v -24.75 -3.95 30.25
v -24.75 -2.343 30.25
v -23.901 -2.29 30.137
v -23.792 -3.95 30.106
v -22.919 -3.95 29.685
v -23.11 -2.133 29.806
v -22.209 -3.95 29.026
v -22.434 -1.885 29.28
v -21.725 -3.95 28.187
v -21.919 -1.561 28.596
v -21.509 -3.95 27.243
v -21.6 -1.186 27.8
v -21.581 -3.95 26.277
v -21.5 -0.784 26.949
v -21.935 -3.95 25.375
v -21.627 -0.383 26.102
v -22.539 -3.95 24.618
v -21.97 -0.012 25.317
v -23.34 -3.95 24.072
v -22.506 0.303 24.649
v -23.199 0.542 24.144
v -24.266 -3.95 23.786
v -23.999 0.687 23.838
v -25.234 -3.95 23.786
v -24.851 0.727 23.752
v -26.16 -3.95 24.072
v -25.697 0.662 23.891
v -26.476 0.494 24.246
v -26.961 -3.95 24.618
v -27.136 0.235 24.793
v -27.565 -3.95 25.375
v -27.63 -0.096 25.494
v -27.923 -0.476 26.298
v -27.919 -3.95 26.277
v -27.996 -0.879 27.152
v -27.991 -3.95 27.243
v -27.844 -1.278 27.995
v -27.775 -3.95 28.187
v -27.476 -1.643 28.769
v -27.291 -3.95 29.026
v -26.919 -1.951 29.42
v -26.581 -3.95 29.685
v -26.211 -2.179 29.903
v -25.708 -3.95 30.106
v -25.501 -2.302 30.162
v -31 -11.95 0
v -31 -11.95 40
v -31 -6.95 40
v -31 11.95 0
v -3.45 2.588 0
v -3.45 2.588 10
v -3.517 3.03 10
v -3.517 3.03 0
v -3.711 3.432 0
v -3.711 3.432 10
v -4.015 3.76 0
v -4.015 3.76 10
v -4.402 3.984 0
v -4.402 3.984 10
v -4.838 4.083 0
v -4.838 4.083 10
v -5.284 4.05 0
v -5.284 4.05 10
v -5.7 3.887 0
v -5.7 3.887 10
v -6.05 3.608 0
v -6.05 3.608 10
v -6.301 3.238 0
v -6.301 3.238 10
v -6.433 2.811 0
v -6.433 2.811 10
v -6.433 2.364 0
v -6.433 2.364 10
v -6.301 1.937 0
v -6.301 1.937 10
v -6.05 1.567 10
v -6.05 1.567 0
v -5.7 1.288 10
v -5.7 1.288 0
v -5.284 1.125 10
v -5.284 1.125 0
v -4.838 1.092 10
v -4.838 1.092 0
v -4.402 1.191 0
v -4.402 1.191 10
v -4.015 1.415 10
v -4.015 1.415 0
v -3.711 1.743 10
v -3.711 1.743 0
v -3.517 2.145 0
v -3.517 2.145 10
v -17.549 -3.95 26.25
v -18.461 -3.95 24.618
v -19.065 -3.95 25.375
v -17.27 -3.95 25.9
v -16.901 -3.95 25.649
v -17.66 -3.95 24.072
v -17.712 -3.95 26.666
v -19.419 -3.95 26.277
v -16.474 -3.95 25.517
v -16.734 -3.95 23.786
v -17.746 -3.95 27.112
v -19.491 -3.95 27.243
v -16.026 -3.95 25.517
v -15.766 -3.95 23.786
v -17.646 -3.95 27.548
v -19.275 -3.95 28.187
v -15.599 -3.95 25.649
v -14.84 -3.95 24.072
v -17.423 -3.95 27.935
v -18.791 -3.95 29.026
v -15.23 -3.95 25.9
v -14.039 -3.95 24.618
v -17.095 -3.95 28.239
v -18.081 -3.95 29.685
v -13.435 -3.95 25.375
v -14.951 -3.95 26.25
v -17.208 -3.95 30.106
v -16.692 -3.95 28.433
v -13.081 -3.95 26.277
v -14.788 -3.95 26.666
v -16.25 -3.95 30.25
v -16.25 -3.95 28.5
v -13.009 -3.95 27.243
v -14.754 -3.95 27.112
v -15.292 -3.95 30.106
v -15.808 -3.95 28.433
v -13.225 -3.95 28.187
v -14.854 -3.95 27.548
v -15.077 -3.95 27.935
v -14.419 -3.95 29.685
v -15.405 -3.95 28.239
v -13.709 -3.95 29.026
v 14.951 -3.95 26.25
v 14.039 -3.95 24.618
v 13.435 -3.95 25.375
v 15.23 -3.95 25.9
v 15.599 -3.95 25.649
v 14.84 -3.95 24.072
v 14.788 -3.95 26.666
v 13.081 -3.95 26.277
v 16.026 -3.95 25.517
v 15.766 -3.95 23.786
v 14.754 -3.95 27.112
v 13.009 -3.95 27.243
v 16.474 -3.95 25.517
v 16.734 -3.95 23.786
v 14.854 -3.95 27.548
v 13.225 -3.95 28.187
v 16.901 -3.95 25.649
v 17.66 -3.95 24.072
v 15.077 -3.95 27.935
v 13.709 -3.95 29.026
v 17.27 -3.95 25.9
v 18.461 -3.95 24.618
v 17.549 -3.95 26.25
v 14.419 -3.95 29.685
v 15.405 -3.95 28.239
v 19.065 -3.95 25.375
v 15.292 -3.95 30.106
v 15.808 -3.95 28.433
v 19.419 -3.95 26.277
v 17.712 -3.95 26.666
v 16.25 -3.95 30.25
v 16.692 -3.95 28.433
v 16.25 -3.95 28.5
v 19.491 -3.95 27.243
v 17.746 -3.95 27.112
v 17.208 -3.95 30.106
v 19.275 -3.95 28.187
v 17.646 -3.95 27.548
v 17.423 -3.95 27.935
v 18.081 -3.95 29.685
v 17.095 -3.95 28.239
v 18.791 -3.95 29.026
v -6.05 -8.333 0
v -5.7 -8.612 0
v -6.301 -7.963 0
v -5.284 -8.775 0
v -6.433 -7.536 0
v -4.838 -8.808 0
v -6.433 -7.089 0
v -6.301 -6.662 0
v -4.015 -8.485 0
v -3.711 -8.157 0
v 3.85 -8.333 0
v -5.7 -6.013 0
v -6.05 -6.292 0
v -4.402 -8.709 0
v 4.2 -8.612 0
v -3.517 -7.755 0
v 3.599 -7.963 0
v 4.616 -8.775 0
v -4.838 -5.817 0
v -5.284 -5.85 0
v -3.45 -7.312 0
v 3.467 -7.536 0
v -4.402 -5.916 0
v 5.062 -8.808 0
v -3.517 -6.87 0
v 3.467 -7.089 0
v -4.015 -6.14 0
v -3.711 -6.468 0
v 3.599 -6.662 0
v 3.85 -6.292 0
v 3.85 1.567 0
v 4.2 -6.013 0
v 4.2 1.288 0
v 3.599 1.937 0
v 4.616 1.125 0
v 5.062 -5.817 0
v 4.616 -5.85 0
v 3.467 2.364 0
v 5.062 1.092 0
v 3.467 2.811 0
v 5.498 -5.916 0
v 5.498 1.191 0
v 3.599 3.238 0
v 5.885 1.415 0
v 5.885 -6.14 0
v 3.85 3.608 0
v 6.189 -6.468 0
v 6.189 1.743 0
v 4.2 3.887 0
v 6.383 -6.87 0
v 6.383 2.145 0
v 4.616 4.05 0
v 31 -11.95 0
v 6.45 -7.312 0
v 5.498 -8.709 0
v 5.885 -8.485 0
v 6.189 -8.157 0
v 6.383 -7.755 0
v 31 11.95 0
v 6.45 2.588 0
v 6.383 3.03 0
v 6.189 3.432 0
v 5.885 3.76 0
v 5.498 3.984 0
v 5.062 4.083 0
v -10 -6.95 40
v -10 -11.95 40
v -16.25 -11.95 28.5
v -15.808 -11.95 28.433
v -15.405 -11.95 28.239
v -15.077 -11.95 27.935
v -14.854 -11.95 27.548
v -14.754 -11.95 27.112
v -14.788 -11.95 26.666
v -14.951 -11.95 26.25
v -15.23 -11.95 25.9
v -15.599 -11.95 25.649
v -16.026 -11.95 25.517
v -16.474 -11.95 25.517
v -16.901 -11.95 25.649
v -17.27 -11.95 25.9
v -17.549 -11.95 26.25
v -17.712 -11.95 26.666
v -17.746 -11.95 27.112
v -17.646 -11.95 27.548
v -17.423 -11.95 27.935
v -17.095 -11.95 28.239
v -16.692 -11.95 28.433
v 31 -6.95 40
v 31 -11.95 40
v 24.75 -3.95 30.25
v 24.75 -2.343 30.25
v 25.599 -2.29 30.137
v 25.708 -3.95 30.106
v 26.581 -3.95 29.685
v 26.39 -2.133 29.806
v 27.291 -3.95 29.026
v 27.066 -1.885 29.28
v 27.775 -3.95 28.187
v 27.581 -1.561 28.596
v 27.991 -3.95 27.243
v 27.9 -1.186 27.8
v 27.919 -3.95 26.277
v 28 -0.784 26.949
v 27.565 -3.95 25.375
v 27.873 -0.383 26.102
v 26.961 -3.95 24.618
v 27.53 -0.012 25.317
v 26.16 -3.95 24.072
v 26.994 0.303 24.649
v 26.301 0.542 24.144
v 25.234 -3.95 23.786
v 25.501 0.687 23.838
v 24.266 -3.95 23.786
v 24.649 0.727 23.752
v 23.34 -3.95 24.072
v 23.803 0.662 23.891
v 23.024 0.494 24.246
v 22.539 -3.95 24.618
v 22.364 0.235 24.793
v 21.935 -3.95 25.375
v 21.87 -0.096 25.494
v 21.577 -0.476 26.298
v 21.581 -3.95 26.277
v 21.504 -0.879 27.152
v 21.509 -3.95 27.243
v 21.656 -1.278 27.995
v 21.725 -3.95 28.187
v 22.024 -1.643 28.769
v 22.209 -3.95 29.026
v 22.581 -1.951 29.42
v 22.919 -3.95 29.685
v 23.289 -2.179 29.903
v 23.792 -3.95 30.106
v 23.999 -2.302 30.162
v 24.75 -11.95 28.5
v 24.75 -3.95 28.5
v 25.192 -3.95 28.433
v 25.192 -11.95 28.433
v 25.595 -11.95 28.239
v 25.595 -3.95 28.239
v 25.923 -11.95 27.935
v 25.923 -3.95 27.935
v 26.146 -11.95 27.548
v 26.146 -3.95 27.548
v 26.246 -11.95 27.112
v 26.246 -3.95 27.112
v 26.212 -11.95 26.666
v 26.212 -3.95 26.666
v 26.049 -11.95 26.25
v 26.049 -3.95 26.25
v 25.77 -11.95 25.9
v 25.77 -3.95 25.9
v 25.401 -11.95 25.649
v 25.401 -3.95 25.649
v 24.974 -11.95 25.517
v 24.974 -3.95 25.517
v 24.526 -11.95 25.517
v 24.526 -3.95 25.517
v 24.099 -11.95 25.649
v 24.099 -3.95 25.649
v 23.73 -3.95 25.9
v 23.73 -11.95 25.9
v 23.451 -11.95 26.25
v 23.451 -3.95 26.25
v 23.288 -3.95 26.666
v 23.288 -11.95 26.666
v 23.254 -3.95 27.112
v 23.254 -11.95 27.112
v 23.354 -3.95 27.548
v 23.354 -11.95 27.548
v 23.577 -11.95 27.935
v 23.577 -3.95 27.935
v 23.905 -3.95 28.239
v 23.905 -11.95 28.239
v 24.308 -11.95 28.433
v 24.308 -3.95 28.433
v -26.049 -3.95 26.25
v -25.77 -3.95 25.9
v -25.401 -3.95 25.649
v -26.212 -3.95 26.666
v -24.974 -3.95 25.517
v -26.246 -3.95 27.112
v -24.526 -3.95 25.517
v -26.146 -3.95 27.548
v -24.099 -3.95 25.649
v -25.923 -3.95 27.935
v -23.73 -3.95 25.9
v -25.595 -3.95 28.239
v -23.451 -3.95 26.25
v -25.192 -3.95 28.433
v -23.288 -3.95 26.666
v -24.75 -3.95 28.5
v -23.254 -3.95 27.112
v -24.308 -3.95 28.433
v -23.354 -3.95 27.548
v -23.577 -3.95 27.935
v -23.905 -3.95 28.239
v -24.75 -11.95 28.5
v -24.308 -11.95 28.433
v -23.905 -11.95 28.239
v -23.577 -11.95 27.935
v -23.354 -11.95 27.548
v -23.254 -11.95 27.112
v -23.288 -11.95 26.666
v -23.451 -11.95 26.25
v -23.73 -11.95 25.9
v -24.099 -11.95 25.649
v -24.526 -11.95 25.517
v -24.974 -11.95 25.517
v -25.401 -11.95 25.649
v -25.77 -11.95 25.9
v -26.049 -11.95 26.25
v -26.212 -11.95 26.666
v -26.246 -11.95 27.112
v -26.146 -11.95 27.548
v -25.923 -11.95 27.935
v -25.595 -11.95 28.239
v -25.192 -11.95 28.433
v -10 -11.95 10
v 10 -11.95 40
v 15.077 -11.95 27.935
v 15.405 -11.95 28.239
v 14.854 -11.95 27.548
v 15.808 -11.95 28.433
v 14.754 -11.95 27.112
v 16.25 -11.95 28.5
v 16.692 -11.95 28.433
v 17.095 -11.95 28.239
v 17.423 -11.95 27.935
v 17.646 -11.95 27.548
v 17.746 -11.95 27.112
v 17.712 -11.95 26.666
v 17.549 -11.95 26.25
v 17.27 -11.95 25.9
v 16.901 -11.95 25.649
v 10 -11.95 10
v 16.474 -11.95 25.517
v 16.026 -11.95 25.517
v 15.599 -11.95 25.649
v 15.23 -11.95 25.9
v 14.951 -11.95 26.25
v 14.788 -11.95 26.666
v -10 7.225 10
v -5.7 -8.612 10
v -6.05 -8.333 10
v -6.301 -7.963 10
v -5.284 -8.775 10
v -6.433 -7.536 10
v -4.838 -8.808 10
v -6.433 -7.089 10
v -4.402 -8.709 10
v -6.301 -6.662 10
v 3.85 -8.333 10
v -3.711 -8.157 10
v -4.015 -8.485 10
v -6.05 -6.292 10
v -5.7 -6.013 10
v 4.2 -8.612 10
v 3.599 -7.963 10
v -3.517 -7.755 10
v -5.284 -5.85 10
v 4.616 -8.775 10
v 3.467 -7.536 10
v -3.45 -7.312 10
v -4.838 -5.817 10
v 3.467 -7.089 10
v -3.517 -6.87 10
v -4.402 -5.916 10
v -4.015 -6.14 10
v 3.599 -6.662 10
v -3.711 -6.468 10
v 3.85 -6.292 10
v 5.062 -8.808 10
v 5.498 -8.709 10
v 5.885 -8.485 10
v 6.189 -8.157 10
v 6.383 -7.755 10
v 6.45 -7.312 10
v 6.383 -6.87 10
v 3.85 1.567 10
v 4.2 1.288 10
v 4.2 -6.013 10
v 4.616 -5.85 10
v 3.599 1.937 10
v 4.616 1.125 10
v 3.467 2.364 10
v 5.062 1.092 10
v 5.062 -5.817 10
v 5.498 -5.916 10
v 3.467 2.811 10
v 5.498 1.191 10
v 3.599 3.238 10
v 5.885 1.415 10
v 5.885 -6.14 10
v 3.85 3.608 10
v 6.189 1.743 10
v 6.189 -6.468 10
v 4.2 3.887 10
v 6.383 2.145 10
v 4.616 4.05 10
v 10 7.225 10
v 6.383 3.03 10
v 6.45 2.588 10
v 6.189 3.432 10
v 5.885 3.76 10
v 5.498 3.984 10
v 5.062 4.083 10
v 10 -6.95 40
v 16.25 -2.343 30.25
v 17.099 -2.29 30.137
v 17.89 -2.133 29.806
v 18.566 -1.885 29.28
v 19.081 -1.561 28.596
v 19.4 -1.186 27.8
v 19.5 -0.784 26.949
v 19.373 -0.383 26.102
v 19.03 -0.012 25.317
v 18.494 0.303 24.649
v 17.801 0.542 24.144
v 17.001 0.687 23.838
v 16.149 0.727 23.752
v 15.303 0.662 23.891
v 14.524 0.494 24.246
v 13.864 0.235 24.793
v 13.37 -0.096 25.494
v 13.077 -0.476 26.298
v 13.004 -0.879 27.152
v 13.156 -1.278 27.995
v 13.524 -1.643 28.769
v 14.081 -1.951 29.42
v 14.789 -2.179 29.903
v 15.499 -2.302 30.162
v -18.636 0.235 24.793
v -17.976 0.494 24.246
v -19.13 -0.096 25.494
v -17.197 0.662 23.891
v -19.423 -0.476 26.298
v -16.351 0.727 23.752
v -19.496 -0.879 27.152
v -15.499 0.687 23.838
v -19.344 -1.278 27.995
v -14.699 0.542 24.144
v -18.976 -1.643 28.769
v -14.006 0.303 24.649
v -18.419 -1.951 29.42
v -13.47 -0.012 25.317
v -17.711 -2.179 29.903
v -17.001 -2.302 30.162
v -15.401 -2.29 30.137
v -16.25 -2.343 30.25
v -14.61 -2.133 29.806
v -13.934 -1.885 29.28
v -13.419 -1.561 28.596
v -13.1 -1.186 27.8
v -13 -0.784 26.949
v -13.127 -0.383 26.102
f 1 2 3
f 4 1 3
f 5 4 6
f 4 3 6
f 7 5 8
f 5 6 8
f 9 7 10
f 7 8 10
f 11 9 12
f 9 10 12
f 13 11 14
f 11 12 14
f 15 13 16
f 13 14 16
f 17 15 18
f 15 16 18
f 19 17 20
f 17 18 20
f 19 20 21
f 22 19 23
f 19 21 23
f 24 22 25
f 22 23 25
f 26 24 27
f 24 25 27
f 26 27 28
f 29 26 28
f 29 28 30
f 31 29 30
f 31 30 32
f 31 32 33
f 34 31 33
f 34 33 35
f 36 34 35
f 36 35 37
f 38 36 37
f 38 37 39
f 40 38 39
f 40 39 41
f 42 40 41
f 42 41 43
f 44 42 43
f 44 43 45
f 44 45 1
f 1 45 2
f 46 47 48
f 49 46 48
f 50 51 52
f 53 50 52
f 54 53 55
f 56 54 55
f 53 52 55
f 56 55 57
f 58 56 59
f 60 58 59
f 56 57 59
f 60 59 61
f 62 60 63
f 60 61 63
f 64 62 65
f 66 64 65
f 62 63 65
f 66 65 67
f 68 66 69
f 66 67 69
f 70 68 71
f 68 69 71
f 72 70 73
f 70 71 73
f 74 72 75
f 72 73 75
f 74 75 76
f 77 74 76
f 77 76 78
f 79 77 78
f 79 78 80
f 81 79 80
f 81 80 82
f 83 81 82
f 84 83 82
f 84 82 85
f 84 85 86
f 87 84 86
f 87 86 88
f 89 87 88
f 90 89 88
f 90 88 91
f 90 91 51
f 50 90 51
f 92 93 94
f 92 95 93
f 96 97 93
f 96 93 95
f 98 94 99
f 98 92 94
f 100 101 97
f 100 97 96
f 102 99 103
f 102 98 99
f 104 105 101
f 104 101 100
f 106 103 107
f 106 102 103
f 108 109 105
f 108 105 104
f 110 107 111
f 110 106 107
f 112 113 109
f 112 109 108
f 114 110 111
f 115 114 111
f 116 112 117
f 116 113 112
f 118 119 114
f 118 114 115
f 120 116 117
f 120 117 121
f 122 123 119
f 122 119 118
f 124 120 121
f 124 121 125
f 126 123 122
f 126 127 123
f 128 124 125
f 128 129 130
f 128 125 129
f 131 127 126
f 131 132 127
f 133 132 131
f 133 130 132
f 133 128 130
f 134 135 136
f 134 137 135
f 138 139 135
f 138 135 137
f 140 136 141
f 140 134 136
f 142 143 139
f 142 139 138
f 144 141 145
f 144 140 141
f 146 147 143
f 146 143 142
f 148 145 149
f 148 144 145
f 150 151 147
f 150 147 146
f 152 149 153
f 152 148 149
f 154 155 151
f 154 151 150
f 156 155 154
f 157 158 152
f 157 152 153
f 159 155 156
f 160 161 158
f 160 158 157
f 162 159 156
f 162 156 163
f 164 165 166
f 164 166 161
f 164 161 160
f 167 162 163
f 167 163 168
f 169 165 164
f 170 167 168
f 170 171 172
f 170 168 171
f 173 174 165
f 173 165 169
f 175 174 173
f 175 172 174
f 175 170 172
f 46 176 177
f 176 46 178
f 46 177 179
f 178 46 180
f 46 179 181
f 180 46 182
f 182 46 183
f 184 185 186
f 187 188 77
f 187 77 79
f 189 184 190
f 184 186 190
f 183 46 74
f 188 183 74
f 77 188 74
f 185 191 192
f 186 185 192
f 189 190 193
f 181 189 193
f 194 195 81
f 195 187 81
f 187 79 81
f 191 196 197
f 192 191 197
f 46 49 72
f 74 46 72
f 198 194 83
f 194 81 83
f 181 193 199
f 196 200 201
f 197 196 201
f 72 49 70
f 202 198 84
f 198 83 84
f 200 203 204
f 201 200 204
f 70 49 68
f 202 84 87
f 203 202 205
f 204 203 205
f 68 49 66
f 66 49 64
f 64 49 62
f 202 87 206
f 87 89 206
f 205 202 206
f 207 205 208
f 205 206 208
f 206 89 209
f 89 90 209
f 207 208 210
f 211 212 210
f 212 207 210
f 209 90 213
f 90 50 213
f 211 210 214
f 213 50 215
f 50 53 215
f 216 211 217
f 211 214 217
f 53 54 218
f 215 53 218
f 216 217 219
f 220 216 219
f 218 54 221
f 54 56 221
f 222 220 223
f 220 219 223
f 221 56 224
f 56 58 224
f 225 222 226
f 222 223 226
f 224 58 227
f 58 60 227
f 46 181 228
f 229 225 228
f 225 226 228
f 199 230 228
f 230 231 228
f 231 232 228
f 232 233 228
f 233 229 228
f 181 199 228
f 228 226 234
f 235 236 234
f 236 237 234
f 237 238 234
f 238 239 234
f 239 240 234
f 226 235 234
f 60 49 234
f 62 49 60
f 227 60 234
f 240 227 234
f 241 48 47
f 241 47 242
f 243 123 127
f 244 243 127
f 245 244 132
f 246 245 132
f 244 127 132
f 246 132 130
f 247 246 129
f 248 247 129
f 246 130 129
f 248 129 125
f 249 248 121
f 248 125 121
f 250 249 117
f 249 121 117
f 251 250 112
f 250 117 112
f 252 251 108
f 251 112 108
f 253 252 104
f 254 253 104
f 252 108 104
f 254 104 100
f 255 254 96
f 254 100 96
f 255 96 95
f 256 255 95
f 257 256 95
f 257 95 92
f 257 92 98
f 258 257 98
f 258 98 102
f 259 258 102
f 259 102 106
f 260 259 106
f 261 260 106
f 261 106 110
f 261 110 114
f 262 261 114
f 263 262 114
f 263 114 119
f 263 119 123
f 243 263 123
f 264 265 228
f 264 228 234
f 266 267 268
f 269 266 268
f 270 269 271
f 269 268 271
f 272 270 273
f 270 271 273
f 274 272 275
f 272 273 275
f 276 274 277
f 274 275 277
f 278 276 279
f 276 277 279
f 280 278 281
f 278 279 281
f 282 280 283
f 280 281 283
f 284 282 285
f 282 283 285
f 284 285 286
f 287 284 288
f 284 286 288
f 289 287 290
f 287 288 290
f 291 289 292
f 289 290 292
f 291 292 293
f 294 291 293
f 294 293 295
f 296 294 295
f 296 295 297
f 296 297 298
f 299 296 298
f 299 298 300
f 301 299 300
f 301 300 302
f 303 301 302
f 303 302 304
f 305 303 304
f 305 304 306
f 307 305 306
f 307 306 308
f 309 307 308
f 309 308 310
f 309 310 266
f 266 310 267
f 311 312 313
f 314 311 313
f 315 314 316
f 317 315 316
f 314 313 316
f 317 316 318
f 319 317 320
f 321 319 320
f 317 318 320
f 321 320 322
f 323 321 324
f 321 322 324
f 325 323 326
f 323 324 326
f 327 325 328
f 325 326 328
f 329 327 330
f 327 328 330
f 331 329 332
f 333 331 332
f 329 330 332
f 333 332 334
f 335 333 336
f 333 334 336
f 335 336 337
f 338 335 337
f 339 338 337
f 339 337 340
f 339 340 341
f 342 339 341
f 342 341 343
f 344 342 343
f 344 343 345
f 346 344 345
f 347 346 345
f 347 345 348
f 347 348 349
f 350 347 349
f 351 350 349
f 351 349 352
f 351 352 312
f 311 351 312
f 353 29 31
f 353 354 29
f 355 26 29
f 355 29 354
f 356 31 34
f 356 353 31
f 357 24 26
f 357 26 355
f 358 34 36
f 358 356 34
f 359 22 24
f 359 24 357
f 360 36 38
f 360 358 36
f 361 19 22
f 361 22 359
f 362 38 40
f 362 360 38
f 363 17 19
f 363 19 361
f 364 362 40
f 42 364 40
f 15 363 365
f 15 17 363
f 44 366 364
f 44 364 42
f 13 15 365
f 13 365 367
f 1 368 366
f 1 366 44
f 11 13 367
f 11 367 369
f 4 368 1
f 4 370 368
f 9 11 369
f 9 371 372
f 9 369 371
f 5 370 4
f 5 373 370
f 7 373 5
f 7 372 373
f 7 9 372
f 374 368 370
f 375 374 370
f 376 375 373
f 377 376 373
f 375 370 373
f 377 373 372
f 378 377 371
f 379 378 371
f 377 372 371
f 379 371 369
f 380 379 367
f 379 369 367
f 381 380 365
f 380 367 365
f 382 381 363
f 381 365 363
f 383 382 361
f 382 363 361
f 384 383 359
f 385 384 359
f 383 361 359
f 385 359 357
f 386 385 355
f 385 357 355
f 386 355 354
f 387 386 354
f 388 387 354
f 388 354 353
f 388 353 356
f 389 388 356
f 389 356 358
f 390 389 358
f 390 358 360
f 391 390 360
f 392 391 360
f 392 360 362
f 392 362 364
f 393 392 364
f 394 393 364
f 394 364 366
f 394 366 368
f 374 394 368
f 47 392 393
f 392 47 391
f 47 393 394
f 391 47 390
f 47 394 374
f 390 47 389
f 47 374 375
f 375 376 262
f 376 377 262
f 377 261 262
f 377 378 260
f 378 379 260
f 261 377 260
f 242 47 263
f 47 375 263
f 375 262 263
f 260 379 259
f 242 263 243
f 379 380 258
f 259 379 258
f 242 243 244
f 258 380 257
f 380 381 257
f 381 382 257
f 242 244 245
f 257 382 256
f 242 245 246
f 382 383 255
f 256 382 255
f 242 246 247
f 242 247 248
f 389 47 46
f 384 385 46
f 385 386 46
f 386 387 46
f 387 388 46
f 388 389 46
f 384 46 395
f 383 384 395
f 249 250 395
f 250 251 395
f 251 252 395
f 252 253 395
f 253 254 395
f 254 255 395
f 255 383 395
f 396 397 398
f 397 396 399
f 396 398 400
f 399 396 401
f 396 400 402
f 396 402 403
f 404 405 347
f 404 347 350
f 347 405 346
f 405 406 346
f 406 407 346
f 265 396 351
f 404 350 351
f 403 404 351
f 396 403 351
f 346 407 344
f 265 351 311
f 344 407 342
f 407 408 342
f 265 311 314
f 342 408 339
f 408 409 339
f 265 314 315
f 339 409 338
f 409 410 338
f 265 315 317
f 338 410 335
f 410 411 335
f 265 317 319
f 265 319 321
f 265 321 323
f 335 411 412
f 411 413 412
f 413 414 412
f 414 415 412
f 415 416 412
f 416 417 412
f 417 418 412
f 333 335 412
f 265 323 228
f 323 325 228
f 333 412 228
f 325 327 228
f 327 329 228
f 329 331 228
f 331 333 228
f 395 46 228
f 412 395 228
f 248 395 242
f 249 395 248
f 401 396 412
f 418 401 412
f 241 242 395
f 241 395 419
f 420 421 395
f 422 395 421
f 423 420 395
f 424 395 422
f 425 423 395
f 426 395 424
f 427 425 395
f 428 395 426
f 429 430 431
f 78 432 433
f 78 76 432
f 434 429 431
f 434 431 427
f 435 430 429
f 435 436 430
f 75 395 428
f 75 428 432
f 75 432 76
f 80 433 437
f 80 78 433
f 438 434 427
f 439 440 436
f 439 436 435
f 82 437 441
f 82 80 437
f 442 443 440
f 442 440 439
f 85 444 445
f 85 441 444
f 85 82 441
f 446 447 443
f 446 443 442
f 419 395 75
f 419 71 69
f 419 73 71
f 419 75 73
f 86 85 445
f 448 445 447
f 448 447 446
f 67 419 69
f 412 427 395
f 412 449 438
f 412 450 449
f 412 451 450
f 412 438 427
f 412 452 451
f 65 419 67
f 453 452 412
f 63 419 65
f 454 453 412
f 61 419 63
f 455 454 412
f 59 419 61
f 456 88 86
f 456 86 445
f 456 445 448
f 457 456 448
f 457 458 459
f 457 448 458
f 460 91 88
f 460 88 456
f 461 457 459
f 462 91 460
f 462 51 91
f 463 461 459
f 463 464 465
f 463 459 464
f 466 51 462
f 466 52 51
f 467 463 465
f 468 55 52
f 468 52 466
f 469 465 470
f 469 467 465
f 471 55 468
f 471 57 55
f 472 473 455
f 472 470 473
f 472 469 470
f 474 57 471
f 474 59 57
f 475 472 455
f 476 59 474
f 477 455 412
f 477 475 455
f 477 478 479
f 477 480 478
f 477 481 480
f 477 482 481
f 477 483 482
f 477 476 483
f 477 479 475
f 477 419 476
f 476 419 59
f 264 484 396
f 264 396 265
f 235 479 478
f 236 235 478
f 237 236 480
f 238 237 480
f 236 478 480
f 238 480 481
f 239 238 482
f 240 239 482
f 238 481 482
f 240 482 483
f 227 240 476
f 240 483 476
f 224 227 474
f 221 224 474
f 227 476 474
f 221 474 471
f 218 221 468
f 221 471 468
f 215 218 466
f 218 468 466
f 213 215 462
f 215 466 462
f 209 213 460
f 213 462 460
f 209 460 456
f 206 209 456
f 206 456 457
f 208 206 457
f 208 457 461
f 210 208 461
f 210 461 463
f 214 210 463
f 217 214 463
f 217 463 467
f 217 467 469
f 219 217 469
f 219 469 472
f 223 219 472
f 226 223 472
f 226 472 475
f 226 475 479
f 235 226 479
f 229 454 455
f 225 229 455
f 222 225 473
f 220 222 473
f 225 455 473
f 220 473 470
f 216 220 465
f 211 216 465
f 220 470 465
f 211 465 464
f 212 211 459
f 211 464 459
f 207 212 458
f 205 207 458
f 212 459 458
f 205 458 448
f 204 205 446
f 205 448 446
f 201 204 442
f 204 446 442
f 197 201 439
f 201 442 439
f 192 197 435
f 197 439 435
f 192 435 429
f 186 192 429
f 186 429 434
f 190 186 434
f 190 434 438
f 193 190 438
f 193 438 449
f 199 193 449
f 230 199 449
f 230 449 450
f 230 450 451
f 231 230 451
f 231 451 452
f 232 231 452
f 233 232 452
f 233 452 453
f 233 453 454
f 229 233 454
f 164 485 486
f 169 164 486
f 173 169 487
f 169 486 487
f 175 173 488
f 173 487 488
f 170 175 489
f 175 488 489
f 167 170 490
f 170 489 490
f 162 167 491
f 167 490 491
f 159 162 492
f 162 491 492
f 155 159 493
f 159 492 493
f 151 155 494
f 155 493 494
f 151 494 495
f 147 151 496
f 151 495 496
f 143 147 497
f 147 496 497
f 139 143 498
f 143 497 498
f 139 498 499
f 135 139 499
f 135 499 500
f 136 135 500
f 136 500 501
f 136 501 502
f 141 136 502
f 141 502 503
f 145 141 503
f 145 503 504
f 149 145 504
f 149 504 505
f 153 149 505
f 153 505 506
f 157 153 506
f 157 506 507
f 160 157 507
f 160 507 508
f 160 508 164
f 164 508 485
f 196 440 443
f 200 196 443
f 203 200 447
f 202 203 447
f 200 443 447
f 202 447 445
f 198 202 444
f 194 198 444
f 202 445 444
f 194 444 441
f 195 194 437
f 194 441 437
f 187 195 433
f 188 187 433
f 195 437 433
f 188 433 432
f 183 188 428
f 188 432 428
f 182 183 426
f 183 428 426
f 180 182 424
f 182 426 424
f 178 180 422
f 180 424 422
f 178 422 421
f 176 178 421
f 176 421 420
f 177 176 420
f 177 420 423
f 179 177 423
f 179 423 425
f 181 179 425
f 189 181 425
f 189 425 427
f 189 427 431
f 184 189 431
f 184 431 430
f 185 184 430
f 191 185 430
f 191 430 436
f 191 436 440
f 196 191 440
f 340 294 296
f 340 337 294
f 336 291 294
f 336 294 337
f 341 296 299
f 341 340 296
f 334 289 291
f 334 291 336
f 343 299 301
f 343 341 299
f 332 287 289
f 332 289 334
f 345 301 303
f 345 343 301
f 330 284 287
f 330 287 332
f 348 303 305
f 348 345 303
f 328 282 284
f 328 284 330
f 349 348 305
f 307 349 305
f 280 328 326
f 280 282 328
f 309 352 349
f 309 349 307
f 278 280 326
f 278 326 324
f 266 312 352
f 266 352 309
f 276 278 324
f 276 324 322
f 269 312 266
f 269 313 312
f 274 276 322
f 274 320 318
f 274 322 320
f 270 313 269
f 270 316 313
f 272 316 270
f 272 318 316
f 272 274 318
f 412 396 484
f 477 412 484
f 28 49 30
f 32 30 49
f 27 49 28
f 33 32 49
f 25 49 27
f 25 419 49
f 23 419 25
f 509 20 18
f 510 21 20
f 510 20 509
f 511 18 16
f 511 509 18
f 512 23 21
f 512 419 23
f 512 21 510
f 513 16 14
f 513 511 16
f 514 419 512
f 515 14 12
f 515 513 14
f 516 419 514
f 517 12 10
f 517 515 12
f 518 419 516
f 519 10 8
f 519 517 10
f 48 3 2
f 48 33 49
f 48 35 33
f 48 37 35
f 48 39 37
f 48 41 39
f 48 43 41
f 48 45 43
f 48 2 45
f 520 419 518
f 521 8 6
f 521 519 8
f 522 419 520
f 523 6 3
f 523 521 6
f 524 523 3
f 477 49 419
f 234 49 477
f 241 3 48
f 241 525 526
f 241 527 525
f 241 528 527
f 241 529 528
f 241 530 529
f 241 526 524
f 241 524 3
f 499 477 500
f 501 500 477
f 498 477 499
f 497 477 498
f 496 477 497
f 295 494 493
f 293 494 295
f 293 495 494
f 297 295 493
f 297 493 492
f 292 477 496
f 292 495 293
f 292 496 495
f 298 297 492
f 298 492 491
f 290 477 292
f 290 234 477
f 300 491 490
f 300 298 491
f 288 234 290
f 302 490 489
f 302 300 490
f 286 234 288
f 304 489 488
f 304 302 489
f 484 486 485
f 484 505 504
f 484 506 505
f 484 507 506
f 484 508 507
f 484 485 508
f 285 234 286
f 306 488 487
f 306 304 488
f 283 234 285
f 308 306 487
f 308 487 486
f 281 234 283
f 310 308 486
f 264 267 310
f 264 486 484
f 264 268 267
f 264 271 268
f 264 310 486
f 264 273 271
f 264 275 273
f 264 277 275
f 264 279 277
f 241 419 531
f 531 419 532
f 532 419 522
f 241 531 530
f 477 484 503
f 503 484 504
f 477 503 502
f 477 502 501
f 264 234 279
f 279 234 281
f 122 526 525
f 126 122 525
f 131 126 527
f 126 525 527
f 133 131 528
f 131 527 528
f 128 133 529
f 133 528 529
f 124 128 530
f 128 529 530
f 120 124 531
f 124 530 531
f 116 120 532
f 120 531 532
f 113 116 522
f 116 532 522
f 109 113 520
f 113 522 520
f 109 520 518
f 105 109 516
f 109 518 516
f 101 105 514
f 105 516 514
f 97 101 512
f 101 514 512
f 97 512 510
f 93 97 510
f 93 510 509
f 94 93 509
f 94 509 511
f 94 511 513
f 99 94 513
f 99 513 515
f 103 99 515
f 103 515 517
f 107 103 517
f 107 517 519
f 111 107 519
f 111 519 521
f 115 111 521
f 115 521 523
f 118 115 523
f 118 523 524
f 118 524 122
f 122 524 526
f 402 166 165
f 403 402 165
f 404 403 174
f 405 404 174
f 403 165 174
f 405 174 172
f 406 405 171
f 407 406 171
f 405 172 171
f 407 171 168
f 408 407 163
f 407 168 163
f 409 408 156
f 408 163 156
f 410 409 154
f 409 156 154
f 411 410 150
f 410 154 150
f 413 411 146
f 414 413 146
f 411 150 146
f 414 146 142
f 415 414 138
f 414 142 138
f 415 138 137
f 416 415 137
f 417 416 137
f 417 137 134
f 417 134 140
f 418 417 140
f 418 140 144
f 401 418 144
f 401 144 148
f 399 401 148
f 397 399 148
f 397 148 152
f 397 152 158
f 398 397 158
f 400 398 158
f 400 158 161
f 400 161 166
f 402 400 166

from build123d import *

# Parameters (mm, degrees)
SKETCH1_W      = 62
SKETCH1_H      = 23.9
EXTRUDE1_DEPTH = 40
SKETCH2_W      = 20
SKETCH2_H      = 23.9
EXTRUDE2_DEPTH = 30
EXTRUDE3_DEPTH = 75.744916215
SKETCH4_R      = 1.5
EXTRUDE4_DEPTH = 45.763852605
SKETCH5_R      = 3.25
EXTRUDE5_DEPTH = 15.9
SKETCH6_R      = 1.5
EXTRUDE6_DEPTH = 56.966150484


with BuildPart() as part:
    # Sketch1 → Extrude1 (new body)
    with BuildSketch(Plane.XY):
        Rectangle(SKETCH1_W, SKETCH1_H)
    extrude(amount=EXTRUDE1_DEPTH)

    # Sketch2 → Extrude2 (cut)
    with BuildSketch(Plane.XY.offset(40)):
        Rectangle(SKETCH2_W, SKETCH2_H)
    extrude(amount=-EXTRUDE2_DEPTH, mode=Mode.SUBTRACT)

    # Sketch3 → Extrude3 (cut, through all)
    with BuildSketch(Plane(origin=(31, 0, 0), x_dir=(0, 0, -1), z_dir=(1, 0, 0))):
        Polygon((-40, -6.95), (-40, 11.95), (0, 11.95), align=None)
    extrude(amount=-EXTRUDE3_DEPTH, mode=Mode.SUBTRACT)

    # Sketch4 → Extrude4 (cut, through all)
    with BuildSketch(Plane.XY.offset(10)):
        with Locations((-4.95, 2.5875)):
            Circle(SKETCH4_R)
        with Locations((4.95, 2.5875)):
            Circle(SKETCH4_R)
        with Locations((4.95, -7.3125)):
            Circle(SKETCH4_R)
        with Locations((-4.95, -7.3125)):
            Circle(SKETCH4_R)
    extrude(amount=-EXTRUDE4_DEPTH, mode=Mode.SUBTRACT)

    # Sketch5 → Extrude5 (cut)
    with BuildSketch(Plane(origin=(0, 11.95, 0), x_dir=(1, 0, 0), z_dir=(0, 1, 0))):
        with Locations(Location((-16.25, -27, 0), (0, 0, 270))):
            Circle(SKETCH5_R)
        with Locations(Location((-24.75, -27, 0), (0, 0, 270))):
            Circle(SKETCH5_R)
        with Locations(Location((24.75, -27, 0), (0, 0, 270))):
            Circle(SKETCH5_R)
        with Locations(Location((16.25, -27, 0), (0, 0, 270))):
            Circle(SKETCH5_R)
    extrude(amount=-EXTRUDE5_DEPTH, mode=Mode.SUBTRACT)

    # Sketch6 → Extrude6 (cut, through all)
    with BuildSketch(Plane(origin=(0, 11.95, 0), x_dir=(1, 0, 0), z_dir=(0, 1, 0))):
        with Locations(Location((-24.75, -27, 0), (0, 0, 270))):
            Circle(SKETCH6_R)
        with Locations(Location((-16.25, -27, 0), (0, 0, 270))):
            Circle(SKETCH6_R)
        with Locations(Location((16.25, -27, 0), (0, 0, 270))):
            Circle(SKETCH6_R)
        with Locations(Location((24.75, -27, 0), (0, 0, 270))):
            Circle(SKETCH6_R)
    extrude(amount=-EXTRUDE6_DEPTH, mode=Mode.SUBTRACT)


solid = part.part
